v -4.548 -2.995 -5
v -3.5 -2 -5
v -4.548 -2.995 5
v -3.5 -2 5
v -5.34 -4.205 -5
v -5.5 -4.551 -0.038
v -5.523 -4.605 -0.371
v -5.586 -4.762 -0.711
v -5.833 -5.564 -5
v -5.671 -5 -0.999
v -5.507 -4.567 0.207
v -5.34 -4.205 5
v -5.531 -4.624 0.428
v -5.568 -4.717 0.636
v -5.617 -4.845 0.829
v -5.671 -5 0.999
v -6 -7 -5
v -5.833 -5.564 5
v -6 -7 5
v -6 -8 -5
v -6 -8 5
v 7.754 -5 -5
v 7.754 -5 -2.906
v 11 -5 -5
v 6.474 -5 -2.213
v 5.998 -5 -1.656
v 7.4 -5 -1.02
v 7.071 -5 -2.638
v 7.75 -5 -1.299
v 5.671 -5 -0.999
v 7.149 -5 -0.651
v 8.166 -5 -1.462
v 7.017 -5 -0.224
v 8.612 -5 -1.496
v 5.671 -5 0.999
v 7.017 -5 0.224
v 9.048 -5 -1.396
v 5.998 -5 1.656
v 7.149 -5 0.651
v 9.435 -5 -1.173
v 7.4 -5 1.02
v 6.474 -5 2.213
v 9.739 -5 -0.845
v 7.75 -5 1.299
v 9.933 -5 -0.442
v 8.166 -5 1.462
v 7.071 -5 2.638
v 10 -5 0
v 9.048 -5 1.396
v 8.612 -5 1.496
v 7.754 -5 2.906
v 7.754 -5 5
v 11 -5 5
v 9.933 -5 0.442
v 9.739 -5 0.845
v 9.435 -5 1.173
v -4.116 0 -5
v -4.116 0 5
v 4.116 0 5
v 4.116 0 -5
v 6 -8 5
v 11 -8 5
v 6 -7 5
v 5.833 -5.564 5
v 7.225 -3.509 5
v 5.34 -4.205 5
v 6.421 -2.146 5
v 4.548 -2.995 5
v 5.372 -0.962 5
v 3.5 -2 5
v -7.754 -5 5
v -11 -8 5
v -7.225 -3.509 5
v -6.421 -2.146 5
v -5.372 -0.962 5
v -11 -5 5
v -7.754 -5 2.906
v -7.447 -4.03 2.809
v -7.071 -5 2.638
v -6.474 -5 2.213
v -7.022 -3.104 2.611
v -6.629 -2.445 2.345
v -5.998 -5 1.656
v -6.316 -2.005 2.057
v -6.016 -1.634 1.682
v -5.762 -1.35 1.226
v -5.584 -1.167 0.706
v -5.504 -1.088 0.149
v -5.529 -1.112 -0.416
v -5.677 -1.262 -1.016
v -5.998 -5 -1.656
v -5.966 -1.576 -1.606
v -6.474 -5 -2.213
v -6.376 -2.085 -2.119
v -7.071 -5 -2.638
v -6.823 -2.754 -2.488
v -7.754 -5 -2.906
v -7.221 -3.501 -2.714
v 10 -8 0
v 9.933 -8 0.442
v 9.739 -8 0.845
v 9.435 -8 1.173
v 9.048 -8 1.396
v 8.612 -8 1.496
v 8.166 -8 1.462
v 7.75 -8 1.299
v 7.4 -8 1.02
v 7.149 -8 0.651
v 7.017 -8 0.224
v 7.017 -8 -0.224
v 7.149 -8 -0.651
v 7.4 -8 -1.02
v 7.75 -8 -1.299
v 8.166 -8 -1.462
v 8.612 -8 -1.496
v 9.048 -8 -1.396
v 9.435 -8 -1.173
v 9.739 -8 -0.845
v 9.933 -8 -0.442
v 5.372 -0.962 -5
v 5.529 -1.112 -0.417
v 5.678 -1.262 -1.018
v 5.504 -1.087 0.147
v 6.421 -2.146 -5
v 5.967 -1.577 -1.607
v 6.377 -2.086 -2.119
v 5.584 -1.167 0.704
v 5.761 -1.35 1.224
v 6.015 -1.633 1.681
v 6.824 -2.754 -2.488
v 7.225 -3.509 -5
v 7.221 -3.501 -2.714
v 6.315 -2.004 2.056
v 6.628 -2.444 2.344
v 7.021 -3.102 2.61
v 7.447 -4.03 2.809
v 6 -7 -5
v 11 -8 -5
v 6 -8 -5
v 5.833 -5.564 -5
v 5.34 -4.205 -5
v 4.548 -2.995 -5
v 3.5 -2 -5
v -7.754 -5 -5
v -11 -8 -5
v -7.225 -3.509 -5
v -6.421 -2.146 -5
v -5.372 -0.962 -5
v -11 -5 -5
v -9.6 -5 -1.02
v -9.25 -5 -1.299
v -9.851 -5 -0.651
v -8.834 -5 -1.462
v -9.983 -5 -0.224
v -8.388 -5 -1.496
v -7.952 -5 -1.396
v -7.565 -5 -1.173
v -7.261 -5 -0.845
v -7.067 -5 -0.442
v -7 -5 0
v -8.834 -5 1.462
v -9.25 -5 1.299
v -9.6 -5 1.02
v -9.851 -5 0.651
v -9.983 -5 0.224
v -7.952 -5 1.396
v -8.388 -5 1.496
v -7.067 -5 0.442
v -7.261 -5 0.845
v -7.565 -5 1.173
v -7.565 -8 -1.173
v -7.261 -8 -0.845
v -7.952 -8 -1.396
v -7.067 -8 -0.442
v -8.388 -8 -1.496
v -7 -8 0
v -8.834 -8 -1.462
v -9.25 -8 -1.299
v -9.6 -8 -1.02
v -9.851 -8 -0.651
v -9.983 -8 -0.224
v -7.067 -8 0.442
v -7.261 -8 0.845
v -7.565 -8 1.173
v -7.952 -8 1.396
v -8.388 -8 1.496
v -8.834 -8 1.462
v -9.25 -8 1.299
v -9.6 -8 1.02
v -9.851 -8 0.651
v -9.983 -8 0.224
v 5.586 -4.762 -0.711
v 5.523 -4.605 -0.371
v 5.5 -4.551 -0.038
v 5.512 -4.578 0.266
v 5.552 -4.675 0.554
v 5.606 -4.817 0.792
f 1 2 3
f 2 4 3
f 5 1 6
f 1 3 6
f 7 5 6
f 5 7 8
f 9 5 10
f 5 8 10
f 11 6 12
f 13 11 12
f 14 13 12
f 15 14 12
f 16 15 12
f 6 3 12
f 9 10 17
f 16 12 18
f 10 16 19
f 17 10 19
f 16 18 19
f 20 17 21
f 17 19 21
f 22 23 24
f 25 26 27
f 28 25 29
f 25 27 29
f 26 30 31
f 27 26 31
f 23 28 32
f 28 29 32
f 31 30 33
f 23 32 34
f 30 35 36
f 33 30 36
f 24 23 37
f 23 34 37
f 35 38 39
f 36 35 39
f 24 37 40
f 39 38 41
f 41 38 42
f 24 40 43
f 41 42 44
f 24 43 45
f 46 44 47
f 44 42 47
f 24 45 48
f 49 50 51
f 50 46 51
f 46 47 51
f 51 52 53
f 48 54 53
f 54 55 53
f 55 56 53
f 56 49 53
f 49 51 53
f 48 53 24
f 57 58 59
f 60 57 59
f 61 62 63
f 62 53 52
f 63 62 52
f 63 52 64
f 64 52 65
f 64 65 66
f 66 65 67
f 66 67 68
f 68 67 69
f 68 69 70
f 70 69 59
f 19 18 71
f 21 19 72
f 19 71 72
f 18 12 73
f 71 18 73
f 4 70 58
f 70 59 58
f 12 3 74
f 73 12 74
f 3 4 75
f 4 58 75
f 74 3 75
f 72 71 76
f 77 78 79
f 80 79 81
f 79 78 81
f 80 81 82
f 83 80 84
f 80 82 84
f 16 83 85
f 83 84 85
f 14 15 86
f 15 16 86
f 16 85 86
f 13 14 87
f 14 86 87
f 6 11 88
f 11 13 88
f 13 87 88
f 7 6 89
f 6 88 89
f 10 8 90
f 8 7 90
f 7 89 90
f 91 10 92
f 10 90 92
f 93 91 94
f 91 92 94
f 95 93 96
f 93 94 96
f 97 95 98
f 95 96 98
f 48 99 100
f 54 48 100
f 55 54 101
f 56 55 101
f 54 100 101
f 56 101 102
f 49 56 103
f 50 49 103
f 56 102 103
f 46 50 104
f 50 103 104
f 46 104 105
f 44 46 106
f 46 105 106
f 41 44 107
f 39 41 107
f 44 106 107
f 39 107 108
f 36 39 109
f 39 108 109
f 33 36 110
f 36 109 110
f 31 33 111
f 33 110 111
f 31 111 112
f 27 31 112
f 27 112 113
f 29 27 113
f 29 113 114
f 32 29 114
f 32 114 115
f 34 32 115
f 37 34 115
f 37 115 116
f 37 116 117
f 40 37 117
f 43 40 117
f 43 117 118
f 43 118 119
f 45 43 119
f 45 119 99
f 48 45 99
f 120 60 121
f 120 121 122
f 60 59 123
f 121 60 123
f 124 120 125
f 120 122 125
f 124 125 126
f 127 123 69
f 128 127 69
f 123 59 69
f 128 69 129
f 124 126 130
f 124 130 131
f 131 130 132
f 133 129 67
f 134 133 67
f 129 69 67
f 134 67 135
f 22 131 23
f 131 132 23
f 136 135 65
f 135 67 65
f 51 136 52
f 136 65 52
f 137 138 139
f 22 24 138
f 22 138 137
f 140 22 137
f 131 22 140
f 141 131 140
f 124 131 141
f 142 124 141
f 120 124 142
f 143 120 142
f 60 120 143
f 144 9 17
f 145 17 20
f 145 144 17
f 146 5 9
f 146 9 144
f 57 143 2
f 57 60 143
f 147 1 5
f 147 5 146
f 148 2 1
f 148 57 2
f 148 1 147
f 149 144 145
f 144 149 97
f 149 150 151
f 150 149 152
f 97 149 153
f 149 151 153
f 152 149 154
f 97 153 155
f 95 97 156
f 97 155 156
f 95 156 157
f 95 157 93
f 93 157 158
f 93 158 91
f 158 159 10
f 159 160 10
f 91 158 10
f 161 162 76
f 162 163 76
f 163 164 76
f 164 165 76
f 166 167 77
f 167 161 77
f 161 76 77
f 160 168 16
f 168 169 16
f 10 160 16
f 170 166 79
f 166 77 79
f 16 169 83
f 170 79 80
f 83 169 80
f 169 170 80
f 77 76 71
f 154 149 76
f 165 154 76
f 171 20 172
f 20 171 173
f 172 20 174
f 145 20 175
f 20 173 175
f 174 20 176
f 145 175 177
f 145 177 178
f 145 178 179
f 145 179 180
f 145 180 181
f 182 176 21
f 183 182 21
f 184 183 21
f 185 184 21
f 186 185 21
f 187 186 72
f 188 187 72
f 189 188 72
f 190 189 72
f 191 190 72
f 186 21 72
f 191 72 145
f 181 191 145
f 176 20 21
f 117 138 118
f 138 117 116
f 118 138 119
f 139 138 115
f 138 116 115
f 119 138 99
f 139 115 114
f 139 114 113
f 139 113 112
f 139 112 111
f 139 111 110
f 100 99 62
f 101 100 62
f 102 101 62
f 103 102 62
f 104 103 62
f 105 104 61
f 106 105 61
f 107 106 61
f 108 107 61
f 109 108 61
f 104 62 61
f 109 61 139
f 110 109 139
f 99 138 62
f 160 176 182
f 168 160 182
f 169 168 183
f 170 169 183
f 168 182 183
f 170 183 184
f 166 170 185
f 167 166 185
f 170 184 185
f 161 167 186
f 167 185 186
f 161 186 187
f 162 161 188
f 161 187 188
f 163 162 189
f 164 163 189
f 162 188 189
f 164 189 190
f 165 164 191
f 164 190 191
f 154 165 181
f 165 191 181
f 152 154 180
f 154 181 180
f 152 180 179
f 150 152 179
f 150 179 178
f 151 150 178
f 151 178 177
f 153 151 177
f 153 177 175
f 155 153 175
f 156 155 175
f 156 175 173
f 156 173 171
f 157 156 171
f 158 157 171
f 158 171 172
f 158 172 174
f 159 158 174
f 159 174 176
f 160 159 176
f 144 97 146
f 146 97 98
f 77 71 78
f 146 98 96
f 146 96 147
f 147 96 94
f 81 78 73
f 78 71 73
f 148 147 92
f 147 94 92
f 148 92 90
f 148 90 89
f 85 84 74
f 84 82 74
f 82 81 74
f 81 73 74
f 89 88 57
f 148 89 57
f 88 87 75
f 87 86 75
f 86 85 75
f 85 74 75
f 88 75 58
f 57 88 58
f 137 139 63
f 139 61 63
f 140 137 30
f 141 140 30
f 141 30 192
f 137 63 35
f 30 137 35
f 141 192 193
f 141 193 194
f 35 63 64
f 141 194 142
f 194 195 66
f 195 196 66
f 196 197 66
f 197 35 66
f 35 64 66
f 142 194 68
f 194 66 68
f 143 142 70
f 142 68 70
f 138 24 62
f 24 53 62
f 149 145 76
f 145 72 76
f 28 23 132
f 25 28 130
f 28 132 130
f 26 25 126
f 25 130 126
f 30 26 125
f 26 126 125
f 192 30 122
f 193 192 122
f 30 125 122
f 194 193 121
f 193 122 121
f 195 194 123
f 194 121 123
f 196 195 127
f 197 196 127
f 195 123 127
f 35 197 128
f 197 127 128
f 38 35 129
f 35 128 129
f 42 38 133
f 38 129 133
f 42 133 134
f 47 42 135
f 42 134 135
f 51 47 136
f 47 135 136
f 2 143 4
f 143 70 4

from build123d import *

# Parameters (mm, degrees)
EXTRUDE_1_DEPTH     = 5
SKETCH_3_R          = 1.5
CUT_EXTRUDE_1_DEPTH = 9
SKETCH_4_R          = 3
CUT_EXTRUDE_2_DEPTH = 5


with BuildPart() as part:
    # 草圖1 → 填料-伸長1 (new body, symmetric)
    with BuildSketch(Plane.XY):
        with BuildLine():
            Line((-4.116062299, 0), (4.116062299, 0))
            ThreePointArc((4.116062299, 0), (6.42113368, -2.146292611), (7.753905297, -5))
            Line((7.753905297, -5), (11, -5))
            Line((11, -5), (11, -8))
            Line((11, -8), (6, -8))
            Line((6, -8), (6, -7))
            ThreePointArc((6, -7), (5.340169944, -4.204915028), (3.5, -2))
            Line((3.5, -2), (-3.5, -2))
            ThreePointArc((-3.5, -2), (-5.340169944, -4.204915028), (-6, -7))
            Line((-6, -7), (-6, -8))
            Line((-6, -8), (-11, -8))
            Line((-11, -8), (-11, -5))
            Line((-11, -5), (-7.753905297, -5))
            ThreePointArc((-7.753905297, -5), (-6.42113368, -2.146292611), (-4.116062299, 0))
        make_face()
    extrude(amount=EXTRUDE_1_DEPTH, both=True)

    # 草圖3 → 除料-伸長1 (cut, through all)
    with BuildSketch(Plane.XZ.offset(8)):
        with Locations((-8.5, 0)):
            Circle(SKETCH_3_R)
        with Locations((8.5, 0)):
            Circle(SKETCH_3_R)
    extrude(amount=-CUT_EXTRUDE_1_DEPTH, mode=Mode.SUBTRACT)

    # 草圖4 → 除料-伸長2 (cut)
    with BuildSketch(Plane(origin=(0, 0, 0), x_dir=(1, 0, 0), z_dir=(0, 1, 0))):
        with Locations((8.5, 0)):
            Circle(SKETCH_4_R)
        with Locations((-8.5, 0)):
            Circle(SKETCH_4_R)
    extrude(amount=-CUT_EXTRUDE_2_DEPTH, mode=Mode.SUBTRACT)


solid = part.part
